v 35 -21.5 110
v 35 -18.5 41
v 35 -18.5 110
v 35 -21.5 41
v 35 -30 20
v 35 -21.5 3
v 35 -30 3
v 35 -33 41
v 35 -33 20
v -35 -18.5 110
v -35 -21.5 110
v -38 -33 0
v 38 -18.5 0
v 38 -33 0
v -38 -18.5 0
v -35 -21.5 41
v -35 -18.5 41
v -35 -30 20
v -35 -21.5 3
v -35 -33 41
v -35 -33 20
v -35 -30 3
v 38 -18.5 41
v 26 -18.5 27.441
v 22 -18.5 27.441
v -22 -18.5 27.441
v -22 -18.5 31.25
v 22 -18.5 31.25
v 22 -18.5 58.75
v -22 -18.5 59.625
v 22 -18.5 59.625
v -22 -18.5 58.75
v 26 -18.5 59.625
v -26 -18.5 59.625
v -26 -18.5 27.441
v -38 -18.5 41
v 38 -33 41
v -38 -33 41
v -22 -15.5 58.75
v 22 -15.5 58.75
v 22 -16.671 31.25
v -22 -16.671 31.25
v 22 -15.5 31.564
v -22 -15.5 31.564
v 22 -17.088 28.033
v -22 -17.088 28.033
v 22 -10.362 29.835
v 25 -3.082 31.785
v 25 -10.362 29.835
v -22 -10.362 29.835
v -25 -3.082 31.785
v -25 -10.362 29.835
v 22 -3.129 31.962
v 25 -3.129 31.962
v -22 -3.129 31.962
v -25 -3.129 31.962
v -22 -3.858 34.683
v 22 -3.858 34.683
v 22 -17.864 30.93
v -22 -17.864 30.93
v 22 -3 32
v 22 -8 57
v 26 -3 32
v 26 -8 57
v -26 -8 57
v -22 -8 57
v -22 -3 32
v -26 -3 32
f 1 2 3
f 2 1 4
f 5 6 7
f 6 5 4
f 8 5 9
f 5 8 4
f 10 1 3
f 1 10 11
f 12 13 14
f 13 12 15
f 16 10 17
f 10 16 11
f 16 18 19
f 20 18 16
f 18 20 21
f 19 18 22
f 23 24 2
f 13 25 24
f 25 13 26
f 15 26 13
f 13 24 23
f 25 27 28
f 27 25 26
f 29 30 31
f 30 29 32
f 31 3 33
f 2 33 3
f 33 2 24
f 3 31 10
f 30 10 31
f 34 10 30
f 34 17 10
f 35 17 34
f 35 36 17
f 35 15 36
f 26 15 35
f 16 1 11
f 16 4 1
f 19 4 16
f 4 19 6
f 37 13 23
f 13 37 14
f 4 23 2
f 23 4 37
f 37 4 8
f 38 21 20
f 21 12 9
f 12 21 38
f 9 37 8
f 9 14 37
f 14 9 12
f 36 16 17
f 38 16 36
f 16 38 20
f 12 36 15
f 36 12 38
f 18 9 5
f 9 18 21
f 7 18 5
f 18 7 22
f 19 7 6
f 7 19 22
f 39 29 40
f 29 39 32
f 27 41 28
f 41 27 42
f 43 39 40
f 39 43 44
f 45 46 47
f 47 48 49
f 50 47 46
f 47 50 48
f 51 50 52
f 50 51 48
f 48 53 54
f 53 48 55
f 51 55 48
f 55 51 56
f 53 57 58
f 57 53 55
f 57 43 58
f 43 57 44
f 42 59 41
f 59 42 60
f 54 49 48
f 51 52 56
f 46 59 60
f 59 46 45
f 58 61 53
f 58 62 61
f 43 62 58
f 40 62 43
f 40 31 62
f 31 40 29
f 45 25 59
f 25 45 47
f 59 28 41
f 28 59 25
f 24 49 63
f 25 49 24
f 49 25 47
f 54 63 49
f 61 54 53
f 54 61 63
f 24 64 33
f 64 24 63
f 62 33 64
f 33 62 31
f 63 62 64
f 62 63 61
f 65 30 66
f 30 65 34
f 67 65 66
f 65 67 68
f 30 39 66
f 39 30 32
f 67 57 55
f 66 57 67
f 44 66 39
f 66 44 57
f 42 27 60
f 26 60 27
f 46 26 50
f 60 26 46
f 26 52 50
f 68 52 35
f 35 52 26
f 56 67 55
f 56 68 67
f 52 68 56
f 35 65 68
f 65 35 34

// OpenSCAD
translate([0,-20,55])
cube([70,3,110], center = true);

translate([35,-33,0])
cube([3,14.5,41]);

mirror(){
    translate([35,-33,0])
cube([3,14.5,41]);
}

translate([-35,-33,0])
cube([70,3,20]);

translate([0,-26,1.5])
cube([70,14,3],center=true);

translate([0,-17,45])
cube([50,3,27.5], center=true);

rotate([15,0,0])
translate([0,-2,33])
cube([50,14.5,3], center=true);


translate([22,-20,60])
rotate([0,90,0])
linear_extrude(4)
 polygon(points=[[0,0],[3,12],[28,17],[33,0]]);

mirror(){
translate([22,-20,60])
rotate([0,90,0])
linear_extrude(4)
 polygon(points=[[0,0],[3,12],[28,17],[33,0]]);
}
